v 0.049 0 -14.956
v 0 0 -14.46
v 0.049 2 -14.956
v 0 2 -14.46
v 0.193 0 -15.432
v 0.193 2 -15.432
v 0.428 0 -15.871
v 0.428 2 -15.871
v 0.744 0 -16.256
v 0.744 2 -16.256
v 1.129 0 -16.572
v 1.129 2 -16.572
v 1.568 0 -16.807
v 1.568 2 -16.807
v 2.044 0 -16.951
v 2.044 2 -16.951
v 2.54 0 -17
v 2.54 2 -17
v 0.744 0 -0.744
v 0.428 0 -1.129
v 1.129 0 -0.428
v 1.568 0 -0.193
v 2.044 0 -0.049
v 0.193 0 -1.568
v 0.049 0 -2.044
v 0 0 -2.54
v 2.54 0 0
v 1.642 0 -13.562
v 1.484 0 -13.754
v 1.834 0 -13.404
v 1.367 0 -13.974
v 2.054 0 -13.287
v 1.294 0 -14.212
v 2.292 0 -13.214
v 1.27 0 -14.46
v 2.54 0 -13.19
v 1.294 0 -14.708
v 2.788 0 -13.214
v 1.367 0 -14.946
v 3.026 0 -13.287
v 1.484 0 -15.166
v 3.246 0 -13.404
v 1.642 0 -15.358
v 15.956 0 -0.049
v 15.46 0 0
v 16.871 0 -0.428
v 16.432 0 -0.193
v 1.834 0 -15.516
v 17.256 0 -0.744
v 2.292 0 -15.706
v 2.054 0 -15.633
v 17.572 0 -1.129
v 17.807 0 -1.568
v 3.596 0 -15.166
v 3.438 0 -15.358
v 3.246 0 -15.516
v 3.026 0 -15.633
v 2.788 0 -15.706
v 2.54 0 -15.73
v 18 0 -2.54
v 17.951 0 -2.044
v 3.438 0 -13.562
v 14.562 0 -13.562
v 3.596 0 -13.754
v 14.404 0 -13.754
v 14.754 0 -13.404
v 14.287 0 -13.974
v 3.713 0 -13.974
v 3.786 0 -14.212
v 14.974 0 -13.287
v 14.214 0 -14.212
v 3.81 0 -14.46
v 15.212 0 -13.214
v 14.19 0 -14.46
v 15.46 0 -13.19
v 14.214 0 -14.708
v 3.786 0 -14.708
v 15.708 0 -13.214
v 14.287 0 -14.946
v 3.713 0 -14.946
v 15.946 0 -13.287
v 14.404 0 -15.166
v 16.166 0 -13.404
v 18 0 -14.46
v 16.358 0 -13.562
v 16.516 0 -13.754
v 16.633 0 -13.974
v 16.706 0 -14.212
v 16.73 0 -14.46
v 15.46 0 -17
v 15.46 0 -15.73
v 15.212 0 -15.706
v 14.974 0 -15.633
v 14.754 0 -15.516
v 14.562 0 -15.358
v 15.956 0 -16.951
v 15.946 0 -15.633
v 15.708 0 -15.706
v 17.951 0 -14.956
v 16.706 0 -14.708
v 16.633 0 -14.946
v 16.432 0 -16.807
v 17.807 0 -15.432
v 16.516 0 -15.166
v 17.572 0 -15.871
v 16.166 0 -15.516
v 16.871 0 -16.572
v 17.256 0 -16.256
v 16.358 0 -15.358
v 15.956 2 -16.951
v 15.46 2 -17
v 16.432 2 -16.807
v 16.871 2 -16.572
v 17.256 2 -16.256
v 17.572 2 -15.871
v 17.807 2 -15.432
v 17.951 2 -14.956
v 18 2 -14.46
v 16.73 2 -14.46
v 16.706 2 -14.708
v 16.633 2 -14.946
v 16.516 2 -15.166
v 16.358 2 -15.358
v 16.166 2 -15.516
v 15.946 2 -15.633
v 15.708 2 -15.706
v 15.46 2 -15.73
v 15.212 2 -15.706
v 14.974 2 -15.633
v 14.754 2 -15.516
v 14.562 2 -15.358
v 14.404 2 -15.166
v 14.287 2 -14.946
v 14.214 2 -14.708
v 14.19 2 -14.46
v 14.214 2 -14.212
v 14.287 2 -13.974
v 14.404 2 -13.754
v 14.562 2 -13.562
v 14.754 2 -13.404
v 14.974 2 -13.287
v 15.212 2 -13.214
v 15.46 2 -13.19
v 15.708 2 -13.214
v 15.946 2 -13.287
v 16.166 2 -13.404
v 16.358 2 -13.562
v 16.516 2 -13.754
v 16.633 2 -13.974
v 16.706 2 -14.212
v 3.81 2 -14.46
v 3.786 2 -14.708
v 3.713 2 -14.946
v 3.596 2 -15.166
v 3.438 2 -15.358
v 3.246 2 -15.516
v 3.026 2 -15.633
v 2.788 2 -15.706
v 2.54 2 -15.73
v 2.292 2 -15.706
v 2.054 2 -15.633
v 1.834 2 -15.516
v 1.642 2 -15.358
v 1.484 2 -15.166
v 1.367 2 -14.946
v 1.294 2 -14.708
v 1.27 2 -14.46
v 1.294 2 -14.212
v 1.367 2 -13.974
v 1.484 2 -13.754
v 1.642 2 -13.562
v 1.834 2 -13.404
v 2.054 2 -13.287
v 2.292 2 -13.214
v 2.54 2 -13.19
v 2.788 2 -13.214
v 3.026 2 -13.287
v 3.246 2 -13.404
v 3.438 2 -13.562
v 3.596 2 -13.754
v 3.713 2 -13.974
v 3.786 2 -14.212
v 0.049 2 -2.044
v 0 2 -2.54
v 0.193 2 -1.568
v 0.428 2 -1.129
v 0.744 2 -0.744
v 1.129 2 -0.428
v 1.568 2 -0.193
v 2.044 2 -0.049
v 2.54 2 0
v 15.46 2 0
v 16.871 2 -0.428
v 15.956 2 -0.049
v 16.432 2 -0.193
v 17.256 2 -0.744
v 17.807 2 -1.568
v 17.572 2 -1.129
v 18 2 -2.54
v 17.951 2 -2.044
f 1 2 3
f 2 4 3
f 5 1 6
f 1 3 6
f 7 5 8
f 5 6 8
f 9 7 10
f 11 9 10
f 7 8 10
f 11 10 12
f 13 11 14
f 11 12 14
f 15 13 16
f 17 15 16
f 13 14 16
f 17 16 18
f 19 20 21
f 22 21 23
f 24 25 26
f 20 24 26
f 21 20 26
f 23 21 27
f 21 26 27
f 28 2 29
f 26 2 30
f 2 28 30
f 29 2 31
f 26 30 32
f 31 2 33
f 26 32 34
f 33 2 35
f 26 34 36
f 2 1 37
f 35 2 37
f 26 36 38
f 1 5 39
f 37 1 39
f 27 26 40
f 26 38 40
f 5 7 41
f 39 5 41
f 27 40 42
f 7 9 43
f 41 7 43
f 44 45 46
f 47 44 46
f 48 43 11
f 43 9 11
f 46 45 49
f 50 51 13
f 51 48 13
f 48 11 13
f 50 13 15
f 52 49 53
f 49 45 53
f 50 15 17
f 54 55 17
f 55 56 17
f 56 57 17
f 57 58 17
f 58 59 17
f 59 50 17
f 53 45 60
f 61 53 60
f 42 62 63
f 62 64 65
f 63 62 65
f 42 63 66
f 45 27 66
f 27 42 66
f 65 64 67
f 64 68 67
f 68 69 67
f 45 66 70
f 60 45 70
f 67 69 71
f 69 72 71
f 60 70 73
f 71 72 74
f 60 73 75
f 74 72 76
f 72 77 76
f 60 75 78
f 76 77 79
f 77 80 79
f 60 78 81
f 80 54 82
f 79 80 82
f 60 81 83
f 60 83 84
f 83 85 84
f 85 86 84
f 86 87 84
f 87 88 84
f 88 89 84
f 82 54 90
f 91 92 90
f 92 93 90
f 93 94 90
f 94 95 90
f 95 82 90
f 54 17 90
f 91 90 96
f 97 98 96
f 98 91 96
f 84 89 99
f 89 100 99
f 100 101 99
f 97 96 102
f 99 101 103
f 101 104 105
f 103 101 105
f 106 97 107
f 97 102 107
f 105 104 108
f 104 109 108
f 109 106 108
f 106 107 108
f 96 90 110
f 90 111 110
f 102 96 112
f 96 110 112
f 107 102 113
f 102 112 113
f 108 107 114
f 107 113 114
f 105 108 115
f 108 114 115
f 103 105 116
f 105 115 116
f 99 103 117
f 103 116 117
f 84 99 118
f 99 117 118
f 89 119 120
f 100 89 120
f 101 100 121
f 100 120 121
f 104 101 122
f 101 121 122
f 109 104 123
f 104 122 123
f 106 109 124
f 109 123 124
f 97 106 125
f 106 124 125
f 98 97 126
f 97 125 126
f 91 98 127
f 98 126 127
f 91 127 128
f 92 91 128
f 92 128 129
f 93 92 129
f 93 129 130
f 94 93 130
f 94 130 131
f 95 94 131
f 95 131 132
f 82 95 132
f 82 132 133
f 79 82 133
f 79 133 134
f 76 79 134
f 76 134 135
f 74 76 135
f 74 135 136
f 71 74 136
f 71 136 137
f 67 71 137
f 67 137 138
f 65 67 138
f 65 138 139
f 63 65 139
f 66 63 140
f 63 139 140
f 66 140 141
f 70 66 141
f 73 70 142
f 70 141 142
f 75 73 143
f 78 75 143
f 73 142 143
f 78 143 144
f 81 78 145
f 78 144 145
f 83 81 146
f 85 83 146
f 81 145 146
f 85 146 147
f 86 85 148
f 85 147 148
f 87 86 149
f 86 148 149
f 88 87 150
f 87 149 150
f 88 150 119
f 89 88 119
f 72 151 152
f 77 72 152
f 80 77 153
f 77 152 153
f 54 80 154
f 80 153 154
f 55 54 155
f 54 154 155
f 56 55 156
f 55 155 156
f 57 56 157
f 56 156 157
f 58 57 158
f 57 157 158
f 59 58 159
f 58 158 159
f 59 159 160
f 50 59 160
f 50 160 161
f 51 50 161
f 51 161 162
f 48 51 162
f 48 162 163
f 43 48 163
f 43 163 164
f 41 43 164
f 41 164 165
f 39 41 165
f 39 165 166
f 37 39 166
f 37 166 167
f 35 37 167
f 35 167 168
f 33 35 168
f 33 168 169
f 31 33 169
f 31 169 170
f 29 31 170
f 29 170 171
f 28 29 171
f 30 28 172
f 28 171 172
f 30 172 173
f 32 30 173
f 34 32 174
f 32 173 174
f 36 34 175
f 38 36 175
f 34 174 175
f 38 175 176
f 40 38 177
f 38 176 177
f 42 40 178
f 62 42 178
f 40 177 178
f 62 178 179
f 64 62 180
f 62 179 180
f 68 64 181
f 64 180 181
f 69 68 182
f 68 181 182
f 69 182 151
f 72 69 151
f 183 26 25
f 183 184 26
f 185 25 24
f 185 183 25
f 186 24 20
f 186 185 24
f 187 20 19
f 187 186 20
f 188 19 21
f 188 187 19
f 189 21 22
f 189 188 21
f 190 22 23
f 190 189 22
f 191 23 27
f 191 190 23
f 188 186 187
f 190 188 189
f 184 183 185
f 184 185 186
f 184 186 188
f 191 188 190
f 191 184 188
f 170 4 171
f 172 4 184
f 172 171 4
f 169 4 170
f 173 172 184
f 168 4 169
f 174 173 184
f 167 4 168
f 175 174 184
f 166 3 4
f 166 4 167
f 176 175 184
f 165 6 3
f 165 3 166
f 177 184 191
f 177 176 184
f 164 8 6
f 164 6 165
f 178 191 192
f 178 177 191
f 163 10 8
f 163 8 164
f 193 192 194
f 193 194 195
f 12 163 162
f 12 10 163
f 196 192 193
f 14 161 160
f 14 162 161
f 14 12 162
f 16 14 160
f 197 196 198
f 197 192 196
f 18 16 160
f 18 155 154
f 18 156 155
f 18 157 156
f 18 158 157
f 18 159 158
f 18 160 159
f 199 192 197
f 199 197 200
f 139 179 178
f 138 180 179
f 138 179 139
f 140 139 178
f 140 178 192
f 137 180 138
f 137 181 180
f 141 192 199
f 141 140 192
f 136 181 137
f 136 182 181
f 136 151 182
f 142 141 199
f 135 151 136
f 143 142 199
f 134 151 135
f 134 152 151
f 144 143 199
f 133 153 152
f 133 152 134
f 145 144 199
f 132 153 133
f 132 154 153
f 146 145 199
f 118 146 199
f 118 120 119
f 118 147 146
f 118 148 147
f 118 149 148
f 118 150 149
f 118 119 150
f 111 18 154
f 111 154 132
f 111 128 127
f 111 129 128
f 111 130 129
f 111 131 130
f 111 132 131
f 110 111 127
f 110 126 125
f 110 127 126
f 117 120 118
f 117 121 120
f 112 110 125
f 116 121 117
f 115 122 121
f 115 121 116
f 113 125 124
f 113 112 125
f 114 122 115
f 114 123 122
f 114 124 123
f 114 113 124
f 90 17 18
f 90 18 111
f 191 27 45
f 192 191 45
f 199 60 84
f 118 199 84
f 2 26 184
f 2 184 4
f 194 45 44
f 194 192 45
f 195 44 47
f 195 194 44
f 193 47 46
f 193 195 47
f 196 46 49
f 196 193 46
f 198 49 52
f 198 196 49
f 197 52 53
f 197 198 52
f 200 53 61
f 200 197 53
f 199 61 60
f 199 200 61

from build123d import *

# Parameters (mm, degrees)
SKETCH1_W           = 18
SKETCH1_H           = 17
BOSS_EXTRUDE1_DEPTH = 2
SKETCH2_R           = 1.27
CUT_EXTRUDE1_DEPTH  = 3
FILLET1_R           = 2.54


with BuildPart() as part:
    # Sketch1 → Boss-Extrude1 (new body)
    with BuildSketch(Plane(origin=(0, 0, 0), x_dir=(1, 0, 0), z_dir=(0, 1, 0))):
        with Locations((9, 8.5)):
            Rectangle(SKETCH1_W, SKETCH1_H)
    extrude(amount=BOSS_EXTRUDE1_DEPTH)

    # Sketch2 → Cut-Extrude1 (cut, through all)
    with BuildSketch(Plane(origin=(0, 2, 0), x_dir=(1, 0, 0), z_dir=(0, 1, 0))):
        with Locations((2.54, 14.46)):
            Circle(SKETCH2_R)
        with Locations((15.46, 14.46)):
            Circle(SKETCH2_R)
    extrude(amount=-CUT_EXTRUDE1_DEPTH, mode=Mode.SUBTRACT)

    # Fillet1
    fillet1_edges = [part.edges().sort_by_distance(p)[0] for p in [
        (0, 1, -17),
        (18, 1, -17),
        (18, 1, 0),
        (0, 1, 0),
    ]]
    fillet(fillet1_edges, radius=FILLET1_R)


solid = part.part
